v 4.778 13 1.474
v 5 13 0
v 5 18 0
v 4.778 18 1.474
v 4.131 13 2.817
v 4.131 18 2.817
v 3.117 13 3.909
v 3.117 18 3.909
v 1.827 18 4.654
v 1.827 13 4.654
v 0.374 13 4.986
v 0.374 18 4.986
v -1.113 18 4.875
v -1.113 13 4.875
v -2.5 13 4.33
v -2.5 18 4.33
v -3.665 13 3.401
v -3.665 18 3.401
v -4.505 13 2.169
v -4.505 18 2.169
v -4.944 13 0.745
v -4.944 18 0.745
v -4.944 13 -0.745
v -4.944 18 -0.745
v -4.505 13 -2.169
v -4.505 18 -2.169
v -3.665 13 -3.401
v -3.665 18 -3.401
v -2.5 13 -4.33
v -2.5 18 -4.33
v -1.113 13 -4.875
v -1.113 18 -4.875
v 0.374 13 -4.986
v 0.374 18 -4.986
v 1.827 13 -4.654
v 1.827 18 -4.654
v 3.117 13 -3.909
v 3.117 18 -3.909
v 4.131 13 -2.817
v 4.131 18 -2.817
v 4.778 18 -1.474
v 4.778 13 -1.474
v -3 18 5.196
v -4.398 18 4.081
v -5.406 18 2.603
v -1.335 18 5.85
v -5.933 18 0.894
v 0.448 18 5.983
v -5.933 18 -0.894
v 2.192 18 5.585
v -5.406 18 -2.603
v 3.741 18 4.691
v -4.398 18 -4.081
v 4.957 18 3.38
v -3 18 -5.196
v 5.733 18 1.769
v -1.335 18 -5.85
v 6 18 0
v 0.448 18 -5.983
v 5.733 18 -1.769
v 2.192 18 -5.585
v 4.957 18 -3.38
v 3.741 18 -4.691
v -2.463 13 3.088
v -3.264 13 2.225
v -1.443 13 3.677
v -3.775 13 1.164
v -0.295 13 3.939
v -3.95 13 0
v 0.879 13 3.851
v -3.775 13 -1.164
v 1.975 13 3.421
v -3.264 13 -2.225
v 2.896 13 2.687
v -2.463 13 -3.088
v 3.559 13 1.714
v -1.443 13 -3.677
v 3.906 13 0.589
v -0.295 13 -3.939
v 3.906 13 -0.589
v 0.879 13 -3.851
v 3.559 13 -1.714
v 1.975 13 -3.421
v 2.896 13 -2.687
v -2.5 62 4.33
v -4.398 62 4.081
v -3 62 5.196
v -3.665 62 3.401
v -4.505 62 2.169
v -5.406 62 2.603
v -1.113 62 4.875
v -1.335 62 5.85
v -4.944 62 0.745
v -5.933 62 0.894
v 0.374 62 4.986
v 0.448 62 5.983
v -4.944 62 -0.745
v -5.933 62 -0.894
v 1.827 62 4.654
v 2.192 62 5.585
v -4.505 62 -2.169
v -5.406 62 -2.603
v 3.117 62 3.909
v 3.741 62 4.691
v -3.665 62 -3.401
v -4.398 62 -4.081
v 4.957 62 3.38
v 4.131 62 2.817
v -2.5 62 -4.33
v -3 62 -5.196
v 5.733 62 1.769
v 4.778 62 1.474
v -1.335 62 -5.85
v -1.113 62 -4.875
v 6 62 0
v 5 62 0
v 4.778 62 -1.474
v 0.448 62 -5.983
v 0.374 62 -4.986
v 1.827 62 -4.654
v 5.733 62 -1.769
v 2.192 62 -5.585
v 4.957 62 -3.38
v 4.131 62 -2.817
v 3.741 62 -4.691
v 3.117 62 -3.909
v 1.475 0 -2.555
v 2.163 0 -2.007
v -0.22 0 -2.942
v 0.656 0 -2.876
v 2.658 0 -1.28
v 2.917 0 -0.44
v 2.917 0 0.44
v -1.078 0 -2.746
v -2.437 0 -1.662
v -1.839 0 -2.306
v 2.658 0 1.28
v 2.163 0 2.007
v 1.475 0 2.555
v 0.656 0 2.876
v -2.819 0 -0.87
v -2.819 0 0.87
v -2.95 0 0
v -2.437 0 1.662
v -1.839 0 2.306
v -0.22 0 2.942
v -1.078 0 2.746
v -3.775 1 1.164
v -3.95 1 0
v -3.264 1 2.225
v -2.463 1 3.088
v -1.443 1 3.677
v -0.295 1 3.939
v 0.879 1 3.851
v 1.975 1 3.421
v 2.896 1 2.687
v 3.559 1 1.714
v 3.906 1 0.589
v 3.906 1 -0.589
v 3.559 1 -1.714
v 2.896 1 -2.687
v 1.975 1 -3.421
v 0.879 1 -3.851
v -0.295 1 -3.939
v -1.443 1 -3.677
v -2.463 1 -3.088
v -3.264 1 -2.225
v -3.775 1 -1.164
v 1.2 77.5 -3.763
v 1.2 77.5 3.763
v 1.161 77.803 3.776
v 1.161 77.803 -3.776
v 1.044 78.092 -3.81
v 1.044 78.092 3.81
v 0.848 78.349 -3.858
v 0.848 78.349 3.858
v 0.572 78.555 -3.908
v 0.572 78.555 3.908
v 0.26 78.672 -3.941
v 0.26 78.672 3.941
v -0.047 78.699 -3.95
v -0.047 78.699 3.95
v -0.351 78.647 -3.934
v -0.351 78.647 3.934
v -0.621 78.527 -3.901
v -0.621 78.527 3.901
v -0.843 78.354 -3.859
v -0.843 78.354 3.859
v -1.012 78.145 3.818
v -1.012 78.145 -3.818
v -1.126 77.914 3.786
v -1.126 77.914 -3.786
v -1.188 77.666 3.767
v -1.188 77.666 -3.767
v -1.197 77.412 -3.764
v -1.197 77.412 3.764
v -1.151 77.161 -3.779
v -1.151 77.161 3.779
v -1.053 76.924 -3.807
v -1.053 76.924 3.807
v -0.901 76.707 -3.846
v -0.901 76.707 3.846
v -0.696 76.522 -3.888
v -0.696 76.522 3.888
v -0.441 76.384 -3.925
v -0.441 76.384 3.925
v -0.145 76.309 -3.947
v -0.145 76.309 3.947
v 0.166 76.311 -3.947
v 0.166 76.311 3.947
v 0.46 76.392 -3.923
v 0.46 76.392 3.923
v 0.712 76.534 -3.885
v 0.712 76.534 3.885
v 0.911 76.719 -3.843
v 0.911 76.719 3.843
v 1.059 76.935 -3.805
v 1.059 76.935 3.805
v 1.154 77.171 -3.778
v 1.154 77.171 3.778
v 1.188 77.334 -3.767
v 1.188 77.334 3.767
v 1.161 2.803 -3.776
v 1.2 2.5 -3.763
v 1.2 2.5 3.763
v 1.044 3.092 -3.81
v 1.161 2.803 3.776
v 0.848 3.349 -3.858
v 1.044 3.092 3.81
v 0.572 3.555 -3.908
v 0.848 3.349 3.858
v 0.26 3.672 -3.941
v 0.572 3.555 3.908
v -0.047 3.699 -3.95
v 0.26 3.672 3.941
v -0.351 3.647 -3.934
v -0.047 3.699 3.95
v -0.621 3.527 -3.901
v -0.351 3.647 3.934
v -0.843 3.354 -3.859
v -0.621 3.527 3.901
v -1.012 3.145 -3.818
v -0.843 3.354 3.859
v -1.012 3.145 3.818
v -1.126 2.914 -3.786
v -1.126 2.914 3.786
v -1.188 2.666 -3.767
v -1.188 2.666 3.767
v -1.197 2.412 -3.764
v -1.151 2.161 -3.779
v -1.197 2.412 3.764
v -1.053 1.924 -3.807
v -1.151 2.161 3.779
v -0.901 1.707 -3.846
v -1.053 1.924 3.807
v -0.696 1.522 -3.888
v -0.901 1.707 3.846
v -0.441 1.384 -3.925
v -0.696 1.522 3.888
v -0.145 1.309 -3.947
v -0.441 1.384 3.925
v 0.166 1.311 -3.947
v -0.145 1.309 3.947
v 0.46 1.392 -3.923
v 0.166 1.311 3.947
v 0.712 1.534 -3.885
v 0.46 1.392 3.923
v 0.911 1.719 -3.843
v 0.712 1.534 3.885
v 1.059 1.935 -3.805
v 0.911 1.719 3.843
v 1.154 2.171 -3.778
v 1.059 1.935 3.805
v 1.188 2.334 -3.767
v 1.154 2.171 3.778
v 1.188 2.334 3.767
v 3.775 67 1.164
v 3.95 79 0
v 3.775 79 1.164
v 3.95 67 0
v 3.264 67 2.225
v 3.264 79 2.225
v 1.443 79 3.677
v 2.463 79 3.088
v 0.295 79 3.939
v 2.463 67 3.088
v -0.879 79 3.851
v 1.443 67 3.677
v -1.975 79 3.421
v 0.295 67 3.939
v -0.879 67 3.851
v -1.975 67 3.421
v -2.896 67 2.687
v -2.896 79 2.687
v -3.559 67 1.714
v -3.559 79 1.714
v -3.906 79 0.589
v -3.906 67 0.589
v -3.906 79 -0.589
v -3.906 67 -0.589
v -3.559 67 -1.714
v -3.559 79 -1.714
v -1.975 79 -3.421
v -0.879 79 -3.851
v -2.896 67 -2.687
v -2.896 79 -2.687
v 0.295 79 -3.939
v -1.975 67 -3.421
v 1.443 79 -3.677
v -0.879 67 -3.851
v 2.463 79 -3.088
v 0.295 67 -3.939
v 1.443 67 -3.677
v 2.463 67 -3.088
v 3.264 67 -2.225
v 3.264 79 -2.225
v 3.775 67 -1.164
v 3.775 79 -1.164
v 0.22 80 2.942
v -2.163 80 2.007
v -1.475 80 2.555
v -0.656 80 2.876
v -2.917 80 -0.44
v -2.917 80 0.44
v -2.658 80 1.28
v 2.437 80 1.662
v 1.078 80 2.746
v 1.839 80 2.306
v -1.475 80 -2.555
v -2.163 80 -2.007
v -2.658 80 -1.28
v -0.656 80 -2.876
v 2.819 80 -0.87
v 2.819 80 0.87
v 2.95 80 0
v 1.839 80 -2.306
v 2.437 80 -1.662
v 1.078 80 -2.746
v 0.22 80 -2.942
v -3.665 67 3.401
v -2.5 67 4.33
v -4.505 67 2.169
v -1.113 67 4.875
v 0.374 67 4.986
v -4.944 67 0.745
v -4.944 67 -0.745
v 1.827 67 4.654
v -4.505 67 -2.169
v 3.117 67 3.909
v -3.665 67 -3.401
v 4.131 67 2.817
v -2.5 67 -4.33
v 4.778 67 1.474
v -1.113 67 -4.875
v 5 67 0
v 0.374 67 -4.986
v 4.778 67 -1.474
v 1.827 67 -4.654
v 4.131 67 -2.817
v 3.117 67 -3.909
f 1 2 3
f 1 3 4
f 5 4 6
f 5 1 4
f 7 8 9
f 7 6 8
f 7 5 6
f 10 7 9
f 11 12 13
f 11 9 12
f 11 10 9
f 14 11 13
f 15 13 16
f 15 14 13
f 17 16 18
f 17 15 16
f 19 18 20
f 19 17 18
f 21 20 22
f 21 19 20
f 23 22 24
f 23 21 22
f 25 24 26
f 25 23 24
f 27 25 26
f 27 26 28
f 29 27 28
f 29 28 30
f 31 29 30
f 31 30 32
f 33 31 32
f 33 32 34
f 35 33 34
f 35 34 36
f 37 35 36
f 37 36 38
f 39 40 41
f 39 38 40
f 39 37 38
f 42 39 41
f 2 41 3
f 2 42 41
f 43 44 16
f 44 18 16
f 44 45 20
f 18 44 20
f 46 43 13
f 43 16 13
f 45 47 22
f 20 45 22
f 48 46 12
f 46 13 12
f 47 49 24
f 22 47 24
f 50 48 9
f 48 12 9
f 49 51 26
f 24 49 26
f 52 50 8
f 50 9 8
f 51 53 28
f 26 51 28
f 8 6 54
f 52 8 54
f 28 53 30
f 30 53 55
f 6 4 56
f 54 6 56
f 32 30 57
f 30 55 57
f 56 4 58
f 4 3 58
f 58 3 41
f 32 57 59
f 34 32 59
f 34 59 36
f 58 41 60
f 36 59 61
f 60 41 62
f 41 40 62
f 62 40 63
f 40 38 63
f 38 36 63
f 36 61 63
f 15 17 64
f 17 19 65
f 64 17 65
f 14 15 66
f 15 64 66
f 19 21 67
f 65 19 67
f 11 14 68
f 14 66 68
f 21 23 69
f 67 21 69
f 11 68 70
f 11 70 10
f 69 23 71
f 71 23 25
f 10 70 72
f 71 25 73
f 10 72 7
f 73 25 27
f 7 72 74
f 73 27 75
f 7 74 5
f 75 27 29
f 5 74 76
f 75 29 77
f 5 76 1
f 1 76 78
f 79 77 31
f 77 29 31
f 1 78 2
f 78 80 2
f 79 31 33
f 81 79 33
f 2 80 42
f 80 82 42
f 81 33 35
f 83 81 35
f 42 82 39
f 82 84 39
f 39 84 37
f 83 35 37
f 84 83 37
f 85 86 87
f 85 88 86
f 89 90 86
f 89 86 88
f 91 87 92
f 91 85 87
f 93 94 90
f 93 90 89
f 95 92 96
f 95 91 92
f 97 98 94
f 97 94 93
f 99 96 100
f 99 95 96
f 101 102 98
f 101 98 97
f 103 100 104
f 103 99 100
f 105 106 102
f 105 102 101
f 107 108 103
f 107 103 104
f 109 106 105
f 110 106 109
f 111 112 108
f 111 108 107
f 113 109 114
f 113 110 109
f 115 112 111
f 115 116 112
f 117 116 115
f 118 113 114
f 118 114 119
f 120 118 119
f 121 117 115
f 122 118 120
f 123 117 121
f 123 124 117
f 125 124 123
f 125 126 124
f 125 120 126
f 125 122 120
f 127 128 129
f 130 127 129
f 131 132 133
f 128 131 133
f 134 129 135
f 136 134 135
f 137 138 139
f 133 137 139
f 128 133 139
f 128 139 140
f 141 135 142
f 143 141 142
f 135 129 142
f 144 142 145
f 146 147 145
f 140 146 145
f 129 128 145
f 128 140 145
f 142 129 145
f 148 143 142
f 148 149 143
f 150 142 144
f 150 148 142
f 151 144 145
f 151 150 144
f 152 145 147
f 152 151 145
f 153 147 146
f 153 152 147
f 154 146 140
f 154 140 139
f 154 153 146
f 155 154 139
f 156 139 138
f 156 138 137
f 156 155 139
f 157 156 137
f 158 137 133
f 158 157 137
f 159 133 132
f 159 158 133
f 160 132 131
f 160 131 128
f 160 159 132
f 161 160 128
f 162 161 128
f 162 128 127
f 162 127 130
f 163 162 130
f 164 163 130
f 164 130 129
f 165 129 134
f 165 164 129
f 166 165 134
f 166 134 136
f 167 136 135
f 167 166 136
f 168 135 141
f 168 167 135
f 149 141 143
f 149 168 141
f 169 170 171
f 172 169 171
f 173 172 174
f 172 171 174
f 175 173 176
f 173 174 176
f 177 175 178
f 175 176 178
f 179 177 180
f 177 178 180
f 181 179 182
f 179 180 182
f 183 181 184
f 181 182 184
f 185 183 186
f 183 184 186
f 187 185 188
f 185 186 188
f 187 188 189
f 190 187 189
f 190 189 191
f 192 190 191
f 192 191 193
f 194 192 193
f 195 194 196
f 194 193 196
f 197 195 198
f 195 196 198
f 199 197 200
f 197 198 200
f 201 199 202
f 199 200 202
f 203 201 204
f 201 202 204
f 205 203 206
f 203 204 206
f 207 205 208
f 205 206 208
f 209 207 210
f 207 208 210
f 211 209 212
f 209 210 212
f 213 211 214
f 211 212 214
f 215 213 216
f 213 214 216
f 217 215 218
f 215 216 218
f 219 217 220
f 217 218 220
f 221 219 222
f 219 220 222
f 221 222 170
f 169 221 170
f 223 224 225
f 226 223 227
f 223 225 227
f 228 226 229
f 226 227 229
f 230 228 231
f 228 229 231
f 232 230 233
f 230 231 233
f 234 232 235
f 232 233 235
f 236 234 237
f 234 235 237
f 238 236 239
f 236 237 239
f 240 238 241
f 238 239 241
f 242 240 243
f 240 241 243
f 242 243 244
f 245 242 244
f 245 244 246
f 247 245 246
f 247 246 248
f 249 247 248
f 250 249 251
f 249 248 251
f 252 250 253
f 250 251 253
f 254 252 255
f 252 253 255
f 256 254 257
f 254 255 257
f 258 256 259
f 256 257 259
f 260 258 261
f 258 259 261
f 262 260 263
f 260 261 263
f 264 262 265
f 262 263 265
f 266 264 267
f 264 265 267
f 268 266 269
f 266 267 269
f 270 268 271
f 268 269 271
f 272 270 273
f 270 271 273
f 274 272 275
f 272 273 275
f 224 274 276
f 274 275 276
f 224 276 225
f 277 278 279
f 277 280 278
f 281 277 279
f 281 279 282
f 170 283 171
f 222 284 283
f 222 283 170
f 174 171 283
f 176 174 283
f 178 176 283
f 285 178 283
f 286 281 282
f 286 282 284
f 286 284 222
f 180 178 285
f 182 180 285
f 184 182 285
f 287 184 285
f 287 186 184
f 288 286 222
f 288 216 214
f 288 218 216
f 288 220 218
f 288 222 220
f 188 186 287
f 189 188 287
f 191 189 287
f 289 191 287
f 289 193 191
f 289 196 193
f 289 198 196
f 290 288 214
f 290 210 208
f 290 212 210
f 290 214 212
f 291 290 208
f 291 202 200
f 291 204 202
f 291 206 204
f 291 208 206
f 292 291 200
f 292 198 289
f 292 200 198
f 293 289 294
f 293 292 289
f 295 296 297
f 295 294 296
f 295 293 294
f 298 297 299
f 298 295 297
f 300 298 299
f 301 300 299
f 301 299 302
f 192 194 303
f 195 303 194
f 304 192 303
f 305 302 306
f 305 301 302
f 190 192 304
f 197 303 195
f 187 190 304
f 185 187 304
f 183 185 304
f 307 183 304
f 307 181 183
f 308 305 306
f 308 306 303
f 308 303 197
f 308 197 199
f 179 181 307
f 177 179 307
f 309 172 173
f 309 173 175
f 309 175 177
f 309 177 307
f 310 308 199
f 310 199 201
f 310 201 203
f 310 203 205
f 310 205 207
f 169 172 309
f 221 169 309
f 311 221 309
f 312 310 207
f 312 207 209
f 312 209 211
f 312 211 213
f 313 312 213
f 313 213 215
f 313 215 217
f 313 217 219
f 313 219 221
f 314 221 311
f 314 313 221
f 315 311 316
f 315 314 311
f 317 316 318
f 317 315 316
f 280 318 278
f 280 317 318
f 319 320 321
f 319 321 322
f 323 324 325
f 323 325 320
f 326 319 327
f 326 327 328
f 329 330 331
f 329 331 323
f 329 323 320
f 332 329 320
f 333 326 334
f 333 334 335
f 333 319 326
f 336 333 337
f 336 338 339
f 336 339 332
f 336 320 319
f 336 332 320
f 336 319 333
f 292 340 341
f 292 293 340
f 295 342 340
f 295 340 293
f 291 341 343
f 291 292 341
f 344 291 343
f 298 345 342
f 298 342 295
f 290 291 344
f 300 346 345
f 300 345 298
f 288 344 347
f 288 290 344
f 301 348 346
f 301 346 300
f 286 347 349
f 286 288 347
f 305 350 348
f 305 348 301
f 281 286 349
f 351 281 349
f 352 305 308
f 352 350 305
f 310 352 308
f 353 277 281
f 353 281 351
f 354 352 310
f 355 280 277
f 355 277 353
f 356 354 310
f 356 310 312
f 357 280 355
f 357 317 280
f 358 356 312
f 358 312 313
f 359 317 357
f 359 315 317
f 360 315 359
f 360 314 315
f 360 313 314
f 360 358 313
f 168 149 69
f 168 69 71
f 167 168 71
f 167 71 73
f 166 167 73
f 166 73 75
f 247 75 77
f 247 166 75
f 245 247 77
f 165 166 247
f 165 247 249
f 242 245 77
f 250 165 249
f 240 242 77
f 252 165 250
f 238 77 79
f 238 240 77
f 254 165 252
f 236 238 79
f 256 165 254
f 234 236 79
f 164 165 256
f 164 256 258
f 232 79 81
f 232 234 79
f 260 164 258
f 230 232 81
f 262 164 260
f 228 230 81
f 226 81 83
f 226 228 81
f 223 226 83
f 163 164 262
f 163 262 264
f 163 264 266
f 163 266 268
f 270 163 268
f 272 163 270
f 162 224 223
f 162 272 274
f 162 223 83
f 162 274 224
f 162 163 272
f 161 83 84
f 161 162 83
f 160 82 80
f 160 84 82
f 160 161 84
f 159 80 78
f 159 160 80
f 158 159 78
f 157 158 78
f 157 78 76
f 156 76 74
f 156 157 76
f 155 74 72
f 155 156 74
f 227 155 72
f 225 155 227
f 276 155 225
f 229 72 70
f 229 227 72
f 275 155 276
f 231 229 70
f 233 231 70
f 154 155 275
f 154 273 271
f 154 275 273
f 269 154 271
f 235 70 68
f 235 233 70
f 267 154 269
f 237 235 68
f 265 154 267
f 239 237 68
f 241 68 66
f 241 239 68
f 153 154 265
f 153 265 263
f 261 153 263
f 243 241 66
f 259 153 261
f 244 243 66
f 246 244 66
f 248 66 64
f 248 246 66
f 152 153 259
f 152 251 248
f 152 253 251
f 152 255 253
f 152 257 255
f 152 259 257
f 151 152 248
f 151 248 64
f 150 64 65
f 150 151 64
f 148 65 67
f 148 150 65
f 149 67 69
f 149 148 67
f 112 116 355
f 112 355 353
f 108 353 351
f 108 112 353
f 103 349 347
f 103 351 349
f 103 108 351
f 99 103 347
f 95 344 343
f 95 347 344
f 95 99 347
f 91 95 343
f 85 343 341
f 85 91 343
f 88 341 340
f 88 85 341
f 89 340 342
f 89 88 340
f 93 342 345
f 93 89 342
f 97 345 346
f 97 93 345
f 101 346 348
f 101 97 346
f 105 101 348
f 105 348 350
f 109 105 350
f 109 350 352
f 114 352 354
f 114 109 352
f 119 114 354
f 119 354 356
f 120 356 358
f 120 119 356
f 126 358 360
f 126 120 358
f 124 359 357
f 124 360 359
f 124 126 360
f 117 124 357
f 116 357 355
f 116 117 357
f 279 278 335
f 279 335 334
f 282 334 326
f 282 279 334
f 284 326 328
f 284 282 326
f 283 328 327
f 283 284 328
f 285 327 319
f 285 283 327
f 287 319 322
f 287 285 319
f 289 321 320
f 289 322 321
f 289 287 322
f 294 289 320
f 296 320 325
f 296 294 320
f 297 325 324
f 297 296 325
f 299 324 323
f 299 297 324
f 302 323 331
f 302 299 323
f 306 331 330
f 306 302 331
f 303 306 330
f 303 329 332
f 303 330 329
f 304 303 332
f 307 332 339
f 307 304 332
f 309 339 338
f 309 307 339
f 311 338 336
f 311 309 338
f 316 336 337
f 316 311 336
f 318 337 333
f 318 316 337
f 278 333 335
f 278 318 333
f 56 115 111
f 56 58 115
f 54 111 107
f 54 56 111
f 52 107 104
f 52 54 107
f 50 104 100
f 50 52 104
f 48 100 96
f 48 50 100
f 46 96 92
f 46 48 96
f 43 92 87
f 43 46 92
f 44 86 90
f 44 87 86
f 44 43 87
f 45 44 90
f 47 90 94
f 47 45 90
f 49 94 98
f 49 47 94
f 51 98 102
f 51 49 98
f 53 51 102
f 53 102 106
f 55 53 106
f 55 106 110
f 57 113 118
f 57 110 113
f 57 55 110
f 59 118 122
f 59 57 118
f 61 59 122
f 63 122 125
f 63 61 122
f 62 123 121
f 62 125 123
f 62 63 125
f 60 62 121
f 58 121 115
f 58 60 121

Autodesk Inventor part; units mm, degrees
ref_plane "YZ Plane" through (0, 0, 0) normal (1, 0, 0) x (0, 1, 0)
ref_plane "XZ Plane" through (0, 0, 0) normal (0, 1, 0) x (-1, 0, 0)
ref_plane "XY Plane" through (0, 0, 0) normal (0, 0, 1) x (1, 0, 0)
sketch "Sketch1" plane through (0, 0, 0) normal (0, 1, 0) x (-1, 0, 0)
  circle A0 centre (0, 0) radius 3.95
  dimension "d0" = 7.9
extrude "Extrusion1" add sketch "Sketch1" along normal blind 13
sketch "Sketch2" plane through (0, 13, 0) normal (0, 1, 0) x (1, 0, 0)
  circle A0 centre (0, 0) radius 5
  dimension "d3" = 10
extrude "Extrusion2" add sketch "Sketch2" along normal blind 5
sketch "Sketch3" plane through (0, 18, 0) normal (0, 1, 0) x (1, 0, 0)
  circle A0 centre (0, 0) radius 6
  dimension "d6" = 12
extrude "Extrusion3" add sketch "Sketch3" along normal blind 44
sketch "Sketch4" plane through (0, 62, 0) normal (0, 1, 0) x (1, 0, 0)
  circle A0 centre (0, 0) radius 5
  dimension "d9" = 10
extrude "Extrusion4" add sketch "Sketch4" along normal blind 5
sketch "Sketch5" plane through (0, 67, 0) normal (0, 1, 0) x (1, 0, 0)
  circle A0 centre (0, 0) radius 3.95
  dimension "d12" = 7.9
extrude "Extrusion5" add sketch "Sketch5" along normal blind 13
sketch "Sketch6" plane through (0, 0, 0) normal (0, 0, 1) x (1, 0, 0)
  circle A0 centre (0, 2.5) radius 1.2
  line L0 (3.95, 0) -> (-3.95, 0) projected
  point P0 (0, 0)
  dimension "d15" = 2.4
  dimension "d16" = 2.5
extrude "Extrusion6" cut sketch "Sketch6" against normal through all both and the other way through all
chamfer "Chamfer1" distance 1 angle 45 1 edges at (3.95, 0, 0)
sketch "Sketch7" plane through (0, 0, 0) normal (1, 0, 0) x (0, 1, 0)
  point P0 (0, 0)
sketch "Sketch8" plane through (0, 0, 0) normal (0, 1, 0) x (-1, 0, 0)
  point P0 (0, 0)
sketch "Sketch9" plane through (0, 0, 0) normal (0, 0, 1) x (1, 0, 0)
  circle A0 centre (0, 77.5) radius 1.2
  line L0 (3.95, 80) -> (-3.95, 80) projected
  point P0 (0, 0)
  dimension "d22" = 2.4
  dimension "d23" = 2.5
extrude "Extrusion7" cut sketch "Sketch9" against normal through all both and the other way through all
chamfer "Chamfer2" distance 1 angle 45 1 edges at (-3.95, 80, 0)
properties part number "Wheel_axle" material "Steel, High Strength, Low Alloy"
